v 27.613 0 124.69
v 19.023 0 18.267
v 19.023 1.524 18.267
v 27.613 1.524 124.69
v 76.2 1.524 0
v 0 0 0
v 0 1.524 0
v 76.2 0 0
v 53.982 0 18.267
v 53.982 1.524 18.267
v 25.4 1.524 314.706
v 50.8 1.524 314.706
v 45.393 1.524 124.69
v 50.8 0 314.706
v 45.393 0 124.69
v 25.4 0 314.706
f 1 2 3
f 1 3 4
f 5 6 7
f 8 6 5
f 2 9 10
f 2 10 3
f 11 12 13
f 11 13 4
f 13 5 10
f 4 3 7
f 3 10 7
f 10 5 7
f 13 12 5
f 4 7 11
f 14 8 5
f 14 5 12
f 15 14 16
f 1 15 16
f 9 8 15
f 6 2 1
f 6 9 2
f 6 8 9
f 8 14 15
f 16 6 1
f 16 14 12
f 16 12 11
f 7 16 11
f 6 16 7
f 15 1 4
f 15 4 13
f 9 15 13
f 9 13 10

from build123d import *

# Parameters (mm, degrees)
BOSS_EXTRUDE1_DEPTH = 1.524
CUT_EXTRUDE1_DEPTH  = 1.524


with BuildPart() as part:
    # Sketch1 → Boss-Extrude1 (new body)
    with BuildSketch(Plane(origin=(0, 0, 0), x_dir=(1, 0, 0), z_dir=(0, 1, 0))):
        Polygon((0, 0), (76.2, 0), (50.8, -314.706), (25.4, -314.706), align=None)
    extrude(amount=BOSS_EXTRUDE1_DEPTH)

    # Sketch4 → Cut-Extrude1 (cut)
    with BuildSketch(Plane(origin=(0, 0, 0), x_dir=(-1, 0, 0), z_dir=(0, -1, 0))):
        Polygon((-27.61263984, -124.689571655), (-45.39263984, -124.689571655), (-53.982012586, -18.267243325), (-19.023267093, -18.267243325), align=None)
    extrude(amount=-CUT_EXTRUDE1_DEPTH, mode=Mode.SUBTRACT)


solid = part.part
